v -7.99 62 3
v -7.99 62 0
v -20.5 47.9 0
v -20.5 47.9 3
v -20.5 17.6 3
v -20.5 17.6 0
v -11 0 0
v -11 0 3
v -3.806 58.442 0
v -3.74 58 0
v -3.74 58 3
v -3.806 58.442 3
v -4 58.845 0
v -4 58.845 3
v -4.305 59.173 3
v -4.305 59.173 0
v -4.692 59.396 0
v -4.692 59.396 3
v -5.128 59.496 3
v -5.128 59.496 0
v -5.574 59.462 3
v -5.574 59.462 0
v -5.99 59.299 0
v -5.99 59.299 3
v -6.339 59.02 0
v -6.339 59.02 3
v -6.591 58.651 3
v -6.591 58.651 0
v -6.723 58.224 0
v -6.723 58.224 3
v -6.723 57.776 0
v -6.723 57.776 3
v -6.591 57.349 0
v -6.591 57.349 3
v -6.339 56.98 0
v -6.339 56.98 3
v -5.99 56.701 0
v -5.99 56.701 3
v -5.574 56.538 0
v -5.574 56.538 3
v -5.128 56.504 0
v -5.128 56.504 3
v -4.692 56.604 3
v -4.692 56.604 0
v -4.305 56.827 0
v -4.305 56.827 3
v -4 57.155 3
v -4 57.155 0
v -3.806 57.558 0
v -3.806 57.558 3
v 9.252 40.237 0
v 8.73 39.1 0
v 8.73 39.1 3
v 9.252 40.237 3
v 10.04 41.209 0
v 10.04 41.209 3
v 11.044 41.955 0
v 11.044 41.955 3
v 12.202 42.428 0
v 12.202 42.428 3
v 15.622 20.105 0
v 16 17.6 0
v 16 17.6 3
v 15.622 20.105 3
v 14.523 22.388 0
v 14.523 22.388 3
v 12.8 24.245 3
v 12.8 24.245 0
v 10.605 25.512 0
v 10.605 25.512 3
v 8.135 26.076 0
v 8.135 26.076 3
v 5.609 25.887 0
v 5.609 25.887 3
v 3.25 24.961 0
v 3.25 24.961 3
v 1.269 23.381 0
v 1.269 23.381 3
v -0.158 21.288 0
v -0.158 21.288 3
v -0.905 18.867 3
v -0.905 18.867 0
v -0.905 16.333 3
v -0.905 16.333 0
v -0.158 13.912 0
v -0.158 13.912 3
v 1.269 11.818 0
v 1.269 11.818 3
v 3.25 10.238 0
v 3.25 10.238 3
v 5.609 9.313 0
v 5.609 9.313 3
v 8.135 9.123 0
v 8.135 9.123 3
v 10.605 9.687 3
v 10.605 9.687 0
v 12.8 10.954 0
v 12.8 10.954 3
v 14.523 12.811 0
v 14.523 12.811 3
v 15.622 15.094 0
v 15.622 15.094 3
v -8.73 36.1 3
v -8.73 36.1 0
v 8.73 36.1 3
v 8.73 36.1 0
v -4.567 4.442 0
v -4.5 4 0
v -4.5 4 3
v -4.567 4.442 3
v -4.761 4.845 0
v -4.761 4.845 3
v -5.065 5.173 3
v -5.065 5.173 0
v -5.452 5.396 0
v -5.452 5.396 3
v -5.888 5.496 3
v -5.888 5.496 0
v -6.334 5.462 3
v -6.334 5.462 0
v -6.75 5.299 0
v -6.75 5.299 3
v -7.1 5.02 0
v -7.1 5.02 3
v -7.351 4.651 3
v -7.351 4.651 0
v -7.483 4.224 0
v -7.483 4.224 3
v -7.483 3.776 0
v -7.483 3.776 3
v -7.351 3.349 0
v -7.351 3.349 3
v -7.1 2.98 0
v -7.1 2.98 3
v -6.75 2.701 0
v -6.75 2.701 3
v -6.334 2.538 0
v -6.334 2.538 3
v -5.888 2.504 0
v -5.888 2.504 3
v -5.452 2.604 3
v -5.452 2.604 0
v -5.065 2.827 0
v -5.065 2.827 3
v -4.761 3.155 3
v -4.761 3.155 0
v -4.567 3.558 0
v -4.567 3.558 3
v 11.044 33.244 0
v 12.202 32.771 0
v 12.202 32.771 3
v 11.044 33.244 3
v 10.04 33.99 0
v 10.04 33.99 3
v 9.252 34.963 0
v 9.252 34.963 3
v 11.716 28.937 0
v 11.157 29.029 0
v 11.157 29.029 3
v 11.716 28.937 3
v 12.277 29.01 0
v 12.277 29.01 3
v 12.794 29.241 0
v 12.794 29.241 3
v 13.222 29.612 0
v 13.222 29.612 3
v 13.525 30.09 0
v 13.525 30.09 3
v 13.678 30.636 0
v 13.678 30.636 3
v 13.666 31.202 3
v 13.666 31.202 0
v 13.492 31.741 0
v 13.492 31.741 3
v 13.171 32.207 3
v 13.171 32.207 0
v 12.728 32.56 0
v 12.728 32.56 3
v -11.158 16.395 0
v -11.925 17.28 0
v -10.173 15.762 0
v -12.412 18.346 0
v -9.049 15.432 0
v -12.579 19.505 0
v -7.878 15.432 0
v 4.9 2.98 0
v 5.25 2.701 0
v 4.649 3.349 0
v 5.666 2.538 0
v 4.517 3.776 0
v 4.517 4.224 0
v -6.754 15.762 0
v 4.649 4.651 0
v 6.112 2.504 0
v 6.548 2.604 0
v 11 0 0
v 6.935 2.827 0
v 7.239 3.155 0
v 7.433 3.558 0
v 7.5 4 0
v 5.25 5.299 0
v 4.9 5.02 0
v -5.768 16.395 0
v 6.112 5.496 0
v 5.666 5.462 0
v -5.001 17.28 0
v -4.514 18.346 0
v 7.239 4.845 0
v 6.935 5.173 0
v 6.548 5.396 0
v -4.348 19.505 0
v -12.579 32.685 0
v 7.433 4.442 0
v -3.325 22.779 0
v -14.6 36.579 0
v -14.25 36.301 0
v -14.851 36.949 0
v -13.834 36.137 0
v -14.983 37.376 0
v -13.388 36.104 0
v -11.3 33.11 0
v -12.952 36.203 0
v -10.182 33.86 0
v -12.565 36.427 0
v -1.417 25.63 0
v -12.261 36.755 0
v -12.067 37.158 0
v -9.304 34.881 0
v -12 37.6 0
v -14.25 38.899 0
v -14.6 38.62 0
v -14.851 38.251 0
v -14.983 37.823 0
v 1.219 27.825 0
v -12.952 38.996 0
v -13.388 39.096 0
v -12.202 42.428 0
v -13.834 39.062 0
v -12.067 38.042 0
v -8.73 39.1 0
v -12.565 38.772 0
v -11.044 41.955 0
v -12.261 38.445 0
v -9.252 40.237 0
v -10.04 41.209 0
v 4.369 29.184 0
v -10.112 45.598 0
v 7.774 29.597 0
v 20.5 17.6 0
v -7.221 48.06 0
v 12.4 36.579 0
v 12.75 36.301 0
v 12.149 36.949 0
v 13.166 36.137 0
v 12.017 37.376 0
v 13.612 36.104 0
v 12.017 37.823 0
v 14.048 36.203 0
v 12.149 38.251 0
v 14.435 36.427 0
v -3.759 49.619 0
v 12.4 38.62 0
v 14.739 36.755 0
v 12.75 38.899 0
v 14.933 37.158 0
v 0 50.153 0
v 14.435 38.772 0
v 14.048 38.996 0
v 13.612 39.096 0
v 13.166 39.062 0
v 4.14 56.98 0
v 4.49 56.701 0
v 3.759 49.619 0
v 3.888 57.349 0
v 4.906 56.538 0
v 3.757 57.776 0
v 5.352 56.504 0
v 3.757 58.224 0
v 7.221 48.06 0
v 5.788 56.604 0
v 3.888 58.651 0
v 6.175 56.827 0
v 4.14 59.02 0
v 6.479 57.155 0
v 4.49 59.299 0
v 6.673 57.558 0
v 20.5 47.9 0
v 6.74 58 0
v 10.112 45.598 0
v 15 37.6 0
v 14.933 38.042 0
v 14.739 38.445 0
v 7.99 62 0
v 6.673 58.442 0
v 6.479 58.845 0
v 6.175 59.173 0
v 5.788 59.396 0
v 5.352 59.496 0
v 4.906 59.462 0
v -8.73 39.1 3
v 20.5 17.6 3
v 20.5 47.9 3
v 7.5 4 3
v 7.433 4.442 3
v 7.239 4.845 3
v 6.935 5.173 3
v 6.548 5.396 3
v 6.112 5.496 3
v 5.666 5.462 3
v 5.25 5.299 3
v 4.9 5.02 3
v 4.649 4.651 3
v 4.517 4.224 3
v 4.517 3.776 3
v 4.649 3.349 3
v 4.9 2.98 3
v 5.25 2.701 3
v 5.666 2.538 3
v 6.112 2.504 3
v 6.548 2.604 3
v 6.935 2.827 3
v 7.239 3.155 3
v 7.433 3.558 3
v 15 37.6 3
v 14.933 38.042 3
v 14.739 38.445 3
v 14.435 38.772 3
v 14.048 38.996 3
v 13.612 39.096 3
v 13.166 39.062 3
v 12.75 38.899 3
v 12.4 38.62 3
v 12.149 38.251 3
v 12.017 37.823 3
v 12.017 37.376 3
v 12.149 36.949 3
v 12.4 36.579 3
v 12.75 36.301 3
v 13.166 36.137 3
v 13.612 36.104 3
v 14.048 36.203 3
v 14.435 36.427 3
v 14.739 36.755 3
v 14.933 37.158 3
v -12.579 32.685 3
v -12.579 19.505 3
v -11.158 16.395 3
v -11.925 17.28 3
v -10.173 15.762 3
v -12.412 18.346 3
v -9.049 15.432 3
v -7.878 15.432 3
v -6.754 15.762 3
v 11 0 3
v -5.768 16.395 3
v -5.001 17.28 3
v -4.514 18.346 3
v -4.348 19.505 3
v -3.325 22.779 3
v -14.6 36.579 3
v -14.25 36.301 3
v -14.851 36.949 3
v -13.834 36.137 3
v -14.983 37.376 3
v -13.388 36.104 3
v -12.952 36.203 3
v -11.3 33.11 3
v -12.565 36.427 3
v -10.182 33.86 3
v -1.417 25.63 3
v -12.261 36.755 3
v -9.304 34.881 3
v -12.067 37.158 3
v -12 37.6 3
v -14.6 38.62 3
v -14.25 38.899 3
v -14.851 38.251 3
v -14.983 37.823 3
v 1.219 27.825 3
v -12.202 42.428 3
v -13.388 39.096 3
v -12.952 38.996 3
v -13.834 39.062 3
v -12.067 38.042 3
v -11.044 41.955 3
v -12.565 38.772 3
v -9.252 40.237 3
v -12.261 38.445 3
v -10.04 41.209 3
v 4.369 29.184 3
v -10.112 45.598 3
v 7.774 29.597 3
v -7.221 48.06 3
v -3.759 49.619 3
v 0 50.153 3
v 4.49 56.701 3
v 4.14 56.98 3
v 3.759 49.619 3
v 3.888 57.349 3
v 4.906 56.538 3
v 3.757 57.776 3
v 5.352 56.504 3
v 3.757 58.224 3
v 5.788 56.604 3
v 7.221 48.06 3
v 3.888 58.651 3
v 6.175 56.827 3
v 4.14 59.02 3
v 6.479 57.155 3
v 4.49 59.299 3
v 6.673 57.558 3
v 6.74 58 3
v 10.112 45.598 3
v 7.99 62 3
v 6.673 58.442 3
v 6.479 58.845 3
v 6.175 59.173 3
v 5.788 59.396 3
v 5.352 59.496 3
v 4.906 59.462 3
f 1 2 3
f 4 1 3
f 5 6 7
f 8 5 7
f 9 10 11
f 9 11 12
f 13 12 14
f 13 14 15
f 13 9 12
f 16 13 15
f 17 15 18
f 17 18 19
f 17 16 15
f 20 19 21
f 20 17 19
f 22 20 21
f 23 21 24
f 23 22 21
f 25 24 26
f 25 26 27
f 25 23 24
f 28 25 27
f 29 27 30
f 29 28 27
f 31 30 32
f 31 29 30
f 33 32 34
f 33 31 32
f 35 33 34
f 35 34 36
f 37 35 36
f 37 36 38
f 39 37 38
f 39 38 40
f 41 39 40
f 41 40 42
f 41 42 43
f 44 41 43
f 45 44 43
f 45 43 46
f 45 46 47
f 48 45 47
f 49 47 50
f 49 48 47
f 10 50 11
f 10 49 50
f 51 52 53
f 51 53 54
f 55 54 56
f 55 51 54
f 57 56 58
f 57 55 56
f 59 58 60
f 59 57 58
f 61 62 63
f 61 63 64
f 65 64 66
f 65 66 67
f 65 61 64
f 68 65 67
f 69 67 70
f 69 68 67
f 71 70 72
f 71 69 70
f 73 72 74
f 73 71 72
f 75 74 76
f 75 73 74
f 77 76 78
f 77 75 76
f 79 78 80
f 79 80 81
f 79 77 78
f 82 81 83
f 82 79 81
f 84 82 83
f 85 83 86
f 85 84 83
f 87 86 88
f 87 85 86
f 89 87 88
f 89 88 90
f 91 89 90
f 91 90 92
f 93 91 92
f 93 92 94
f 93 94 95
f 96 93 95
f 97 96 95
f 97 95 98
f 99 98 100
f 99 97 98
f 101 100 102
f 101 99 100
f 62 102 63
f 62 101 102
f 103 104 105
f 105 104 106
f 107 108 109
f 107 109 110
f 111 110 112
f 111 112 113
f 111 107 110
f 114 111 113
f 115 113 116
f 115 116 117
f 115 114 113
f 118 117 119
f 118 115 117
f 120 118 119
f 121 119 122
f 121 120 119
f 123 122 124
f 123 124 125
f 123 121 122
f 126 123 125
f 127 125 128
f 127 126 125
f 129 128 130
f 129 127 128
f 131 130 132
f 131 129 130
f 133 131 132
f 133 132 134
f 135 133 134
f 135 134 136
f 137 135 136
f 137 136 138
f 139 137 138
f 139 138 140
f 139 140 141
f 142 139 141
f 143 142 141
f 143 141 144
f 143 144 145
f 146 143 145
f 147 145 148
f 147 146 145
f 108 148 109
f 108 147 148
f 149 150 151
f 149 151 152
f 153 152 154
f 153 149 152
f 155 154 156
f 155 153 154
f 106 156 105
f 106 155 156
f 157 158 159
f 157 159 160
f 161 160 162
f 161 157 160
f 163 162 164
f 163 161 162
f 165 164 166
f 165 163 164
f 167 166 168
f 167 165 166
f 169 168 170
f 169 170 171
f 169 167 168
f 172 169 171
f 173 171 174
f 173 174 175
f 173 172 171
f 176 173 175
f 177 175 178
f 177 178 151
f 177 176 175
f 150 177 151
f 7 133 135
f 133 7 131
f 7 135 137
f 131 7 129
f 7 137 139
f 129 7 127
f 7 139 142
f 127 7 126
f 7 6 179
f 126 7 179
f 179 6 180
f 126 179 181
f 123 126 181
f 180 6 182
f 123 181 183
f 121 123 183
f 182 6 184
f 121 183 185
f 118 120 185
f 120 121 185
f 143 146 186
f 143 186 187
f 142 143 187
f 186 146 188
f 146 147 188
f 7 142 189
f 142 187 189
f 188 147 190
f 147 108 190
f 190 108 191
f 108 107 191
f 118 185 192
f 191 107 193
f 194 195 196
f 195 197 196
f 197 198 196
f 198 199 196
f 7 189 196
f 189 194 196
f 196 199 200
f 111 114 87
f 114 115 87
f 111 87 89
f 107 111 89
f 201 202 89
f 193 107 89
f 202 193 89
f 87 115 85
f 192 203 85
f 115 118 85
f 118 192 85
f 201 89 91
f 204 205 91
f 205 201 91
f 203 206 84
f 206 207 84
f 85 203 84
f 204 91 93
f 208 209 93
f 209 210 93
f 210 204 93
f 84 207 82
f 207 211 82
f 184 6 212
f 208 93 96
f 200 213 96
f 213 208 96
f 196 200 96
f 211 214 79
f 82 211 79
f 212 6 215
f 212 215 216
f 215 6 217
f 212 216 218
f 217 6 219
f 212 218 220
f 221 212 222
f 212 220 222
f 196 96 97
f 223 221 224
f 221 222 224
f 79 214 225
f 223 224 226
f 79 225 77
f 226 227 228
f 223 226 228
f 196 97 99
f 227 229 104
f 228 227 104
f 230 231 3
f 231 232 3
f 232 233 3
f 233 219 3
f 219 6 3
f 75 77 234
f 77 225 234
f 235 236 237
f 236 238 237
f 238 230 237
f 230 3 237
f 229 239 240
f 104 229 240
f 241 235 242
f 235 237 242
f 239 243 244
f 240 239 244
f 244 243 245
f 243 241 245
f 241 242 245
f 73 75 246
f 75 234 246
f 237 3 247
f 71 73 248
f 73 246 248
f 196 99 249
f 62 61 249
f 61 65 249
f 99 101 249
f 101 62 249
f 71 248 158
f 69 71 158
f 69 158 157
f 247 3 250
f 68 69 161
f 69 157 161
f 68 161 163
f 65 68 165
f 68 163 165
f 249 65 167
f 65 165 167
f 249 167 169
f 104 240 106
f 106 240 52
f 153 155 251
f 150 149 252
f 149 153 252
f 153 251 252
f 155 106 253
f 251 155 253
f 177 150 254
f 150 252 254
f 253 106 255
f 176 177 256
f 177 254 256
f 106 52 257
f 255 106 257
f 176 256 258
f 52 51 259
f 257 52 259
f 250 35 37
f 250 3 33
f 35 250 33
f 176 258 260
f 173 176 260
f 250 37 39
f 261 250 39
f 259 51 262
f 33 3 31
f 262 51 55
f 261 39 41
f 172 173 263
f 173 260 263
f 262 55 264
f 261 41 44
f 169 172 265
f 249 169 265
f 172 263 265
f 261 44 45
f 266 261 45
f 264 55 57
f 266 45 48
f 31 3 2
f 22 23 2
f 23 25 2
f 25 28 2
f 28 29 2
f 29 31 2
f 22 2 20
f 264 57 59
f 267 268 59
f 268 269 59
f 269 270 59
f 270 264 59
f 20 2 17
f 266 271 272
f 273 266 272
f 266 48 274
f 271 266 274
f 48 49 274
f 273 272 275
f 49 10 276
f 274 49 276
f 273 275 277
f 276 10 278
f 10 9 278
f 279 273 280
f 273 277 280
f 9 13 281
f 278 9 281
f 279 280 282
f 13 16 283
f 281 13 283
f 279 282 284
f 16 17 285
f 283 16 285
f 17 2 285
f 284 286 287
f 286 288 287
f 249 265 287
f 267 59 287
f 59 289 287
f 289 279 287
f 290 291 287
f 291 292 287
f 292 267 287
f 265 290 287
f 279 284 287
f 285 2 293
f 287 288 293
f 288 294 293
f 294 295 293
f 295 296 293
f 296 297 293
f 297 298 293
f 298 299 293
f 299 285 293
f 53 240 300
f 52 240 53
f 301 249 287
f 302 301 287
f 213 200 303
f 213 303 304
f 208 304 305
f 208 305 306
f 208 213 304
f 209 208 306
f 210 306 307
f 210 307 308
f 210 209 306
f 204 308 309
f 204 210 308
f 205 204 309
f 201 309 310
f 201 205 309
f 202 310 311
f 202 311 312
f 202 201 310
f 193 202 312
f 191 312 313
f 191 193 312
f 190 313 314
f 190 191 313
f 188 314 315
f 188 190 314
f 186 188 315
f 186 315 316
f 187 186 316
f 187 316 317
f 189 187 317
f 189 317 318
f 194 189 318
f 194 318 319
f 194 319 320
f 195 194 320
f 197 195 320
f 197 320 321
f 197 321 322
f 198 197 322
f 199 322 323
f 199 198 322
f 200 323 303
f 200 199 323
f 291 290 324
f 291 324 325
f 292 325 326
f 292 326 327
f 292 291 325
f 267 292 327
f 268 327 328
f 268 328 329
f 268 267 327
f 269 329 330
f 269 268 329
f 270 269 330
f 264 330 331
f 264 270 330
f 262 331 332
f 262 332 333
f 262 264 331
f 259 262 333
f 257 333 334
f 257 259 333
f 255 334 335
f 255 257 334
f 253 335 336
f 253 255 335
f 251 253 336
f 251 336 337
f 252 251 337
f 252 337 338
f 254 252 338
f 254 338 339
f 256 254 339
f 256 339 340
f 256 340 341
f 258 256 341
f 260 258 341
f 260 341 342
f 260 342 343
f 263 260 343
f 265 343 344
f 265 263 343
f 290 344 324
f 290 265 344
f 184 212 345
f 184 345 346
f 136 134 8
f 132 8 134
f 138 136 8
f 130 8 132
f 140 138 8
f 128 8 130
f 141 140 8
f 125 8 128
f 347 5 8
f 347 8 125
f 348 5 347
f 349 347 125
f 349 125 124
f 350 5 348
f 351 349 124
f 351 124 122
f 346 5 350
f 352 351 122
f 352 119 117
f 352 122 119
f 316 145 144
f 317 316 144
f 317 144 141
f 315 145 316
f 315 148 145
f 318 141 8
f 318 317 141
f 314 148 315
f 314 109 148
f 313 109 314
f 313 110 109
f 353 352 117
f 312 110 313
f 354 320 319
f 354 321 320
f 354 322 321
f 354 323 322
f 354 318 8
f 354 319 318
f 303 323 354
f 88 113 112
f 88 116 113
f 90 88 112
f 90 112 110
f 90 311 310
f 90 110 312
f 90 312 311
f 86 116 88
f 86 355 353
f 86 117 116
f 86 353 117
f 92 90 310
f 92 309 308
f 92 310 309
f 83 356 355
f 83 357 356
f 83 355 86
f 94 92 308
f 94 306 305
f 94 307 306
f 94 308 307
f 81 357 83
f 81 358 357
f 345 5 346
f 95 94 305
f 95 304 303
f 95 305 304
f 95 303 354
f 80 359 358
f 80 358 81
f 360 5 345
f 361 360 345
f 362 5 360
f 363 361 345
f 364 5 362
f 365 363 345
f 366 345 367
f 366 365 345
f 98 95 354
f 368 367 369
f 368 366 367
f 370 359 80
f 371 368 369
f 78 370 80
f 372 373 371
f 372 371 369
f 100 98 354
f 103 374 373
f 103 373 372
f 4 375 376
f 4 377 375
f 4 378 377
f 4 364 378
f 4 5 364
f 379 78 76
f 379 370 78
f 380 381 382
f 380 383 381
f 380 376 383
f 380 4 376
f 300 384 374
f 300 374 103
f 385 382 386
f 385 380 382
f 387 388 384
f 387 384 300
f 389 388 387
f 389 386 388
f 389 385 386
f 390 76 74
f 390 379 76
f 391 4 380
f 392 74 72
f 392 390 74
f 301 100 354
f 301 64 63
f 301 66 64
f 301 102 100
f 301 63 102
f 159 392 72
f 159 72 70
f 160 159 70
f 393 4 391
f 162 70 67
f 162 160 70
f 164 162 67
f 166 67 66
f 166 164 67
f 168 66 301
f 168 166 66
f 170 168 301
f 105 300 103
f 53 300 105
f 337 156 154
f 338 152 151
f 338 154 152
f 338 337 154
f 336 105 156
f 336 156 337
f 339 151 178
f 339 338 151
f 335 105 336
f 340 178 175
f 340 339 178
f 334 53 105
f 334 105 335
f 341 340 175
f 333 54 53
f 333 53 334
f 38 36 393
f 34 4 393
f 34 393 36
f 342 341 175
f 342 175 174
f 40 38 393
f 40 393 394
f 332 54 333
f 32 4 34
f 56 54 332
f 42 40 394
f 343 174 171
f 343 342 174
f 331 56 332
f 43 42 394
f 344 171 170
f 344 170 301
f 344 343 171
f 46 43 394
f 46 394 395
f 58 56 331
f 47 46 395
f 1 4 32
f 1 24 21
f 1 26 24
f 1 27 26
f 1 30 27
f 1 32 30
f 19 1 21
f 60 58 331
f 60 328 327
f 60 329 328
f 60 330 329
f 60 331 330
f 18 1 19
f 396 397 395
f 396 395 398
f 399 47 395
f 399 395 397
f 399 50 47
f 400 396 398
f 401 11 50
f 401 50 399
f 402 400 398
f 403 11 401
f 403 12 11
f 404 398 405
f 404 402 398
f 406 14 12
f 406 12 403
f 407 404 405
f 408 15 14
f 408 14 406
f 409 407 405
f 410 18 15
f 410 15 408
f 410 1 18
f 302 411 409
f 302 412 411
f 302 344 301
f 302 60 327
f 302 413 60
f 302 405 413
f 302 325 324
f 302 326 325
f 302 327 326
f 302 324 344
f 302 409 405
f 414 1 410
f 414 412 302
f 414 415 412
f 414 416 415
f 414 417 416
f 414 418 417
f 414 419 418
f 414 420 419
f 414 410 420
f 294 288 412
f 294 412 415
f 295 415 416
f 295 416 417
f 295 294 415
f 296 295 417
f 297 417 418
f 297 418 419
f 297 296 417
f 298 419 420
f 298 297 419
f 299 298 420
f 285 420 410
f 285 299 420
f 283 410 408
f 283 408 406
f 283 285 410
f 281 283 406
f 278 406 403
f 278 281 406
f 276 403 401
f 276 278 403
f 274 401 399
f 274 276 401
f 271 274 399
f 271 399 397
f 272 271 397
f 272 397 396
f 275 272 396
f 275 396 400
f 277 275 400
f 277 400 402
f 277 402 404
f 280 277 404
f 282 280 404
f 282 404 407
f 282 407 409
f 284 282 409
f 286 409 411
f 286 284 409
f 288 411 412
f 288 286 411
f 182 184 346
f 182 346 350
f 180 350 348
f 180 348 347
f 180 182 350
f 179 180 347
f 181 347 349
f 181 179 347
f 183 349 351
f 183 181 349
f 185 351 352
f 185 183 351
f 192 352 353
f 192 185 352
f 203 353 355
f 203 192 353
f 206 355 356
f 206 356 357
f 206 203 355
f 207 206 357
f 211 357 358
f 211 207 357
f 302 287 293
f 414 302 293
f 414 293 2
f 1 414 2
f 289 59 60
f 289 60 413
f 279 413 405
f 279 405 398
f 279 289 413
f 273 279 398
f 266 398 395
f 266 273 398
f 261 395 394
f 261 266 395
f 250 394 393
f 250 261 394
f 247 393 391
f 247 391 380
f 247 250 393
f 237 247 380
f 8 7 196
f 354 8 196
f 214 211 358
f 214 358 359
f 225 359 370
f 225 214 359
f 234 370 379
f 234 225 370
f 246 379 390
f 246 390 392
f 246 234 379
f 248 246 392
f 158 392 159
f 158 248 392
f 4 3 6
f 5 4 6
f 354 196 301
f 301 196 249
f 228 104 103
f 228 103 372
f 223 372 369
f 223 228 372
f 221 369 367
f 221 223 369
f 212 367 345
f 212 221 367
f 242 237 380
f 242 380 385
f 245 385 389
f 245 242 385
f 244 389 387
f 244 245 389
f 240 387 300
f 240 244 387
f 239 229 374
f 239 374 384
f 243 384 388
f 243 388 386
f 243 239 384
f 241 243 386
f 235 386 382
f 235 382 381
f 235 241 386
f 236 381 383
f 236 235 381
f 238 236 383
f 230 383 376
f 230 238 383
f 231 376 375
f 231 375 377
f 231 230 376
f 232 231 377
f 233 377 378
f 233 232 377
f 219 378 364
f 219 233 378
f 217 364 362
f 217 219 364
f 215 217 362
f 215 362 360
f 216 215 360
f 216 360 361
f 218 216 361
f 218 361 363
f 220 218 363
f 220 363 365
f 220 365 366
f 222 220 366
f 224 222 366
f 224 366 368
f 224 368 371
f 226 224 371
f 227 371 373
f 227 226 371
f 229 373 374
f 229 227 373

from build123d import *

# Parameters (mm, degrees)
SKETCH_1_R      = 8.5
SKETCH_1_R_2    = 1.5
SKETCH_1_W      = 17.460607986
SKETCH_1_H      = 3
EXTRUDE_1_DEPTH = 3


with BuildPart() as part:
    # 스케치1 → 보스-돌출1 (new body)
    # profile 1 of 2: a face of its own
    with BuildSketch(Plane.XY):
        Polygon((20.5, 17.599715907), (20.5, 47.899715907), (7.989824602, 62), (-7.989824602, 62), (-20.5, 47.899715907), (-20.5, 17.599715907), (-11, 0), (11, 0), align=None)
        with Locations((7.5, 17.599715907)):
            Circle(SKETCH_1_R, mode=Mode.SUBTRACT)
        with Locations((13.5, 37.599715907)):
            Circle(SKETCH_1_R_2, mode=Mode.SUBTRACT)
        with Locations((-5.239824602, 58)):
            Circle(SKETCH_1_R_2, mode=Mode.SUBTRACT)
        with Locations((-6, 4)):
            Circle(SKETCH_1_R_2, mode=Mode.SUBTRACT)
        with Locations((-13.5, 37.599715907)):
            Circle(SKETCH_1_R_2, mode=Mode.SUBTRACT)
        with Locations((6, 4)):
            Circle(SKETCH_1_R_2, mode=Mode.SUBTRACT)
        with Locations((5.239824602, 58)):
            Circle(SKETCH_1_R_2, mode=Mode.SUBTRACT)
        with BuildLine():
            ThreePointArc((11.156743405, 29.02898656), (13.621468977, 30.35740093), (12.202349665, 32.771040767))
            ThreePointArc((12.202349665, 32.771040767), (10.039769884, 33.990449008), (8.730303993, 36.099715907))
            Line((8.730303993, 36.099715907), (8.730303993, 39.099715907))
            ThreePointArc((8.730303993, 39.099715907), (10.039769884, 41.208982805), (12.202349665, 42.428391047))
            ThreePointArc((12.202349665, 42.428391047), (0, 50.15321463), (-12.202349665, 42.428391047))
            ThreePointArc((-12.202349665, 42.428391047), (-10.039769884, 41.208982805), (-8.730303993, 39.099715907))
            Line((-8.730303993, 39.099715907), (-8.730303993, 36.099715907))
            ThreePointArc((-8.730303993, 36.099715907), (-10.181651088, 33.8595875), (-12.578672362, 32.685333404))
            Line((-12.578672362, 32.685333404), (-12.578672362, 19.505123412))
            ThreePointArc((-12.578672362, 19.505123412), (-8.463216291, 15.389667341), (-4.34776022, 19.505123412))
            ThreePointArc((-4.34776022, 19.505123412), (1.219141664, 27.824725372), (11.156743405, 29.02898656))
        make_face(mode=Mode.SUBTRACT)
    # profile 2 of 2: a face of its own
    with BuildSketch(Plane.XY):
        with Locations((0, 37.599715907)):
            Rectangle(SKETCH_1_W, SKETCH_1_H)
    extrude(amount=EXTRUDE_1_DEPTH)


solid = part.part
